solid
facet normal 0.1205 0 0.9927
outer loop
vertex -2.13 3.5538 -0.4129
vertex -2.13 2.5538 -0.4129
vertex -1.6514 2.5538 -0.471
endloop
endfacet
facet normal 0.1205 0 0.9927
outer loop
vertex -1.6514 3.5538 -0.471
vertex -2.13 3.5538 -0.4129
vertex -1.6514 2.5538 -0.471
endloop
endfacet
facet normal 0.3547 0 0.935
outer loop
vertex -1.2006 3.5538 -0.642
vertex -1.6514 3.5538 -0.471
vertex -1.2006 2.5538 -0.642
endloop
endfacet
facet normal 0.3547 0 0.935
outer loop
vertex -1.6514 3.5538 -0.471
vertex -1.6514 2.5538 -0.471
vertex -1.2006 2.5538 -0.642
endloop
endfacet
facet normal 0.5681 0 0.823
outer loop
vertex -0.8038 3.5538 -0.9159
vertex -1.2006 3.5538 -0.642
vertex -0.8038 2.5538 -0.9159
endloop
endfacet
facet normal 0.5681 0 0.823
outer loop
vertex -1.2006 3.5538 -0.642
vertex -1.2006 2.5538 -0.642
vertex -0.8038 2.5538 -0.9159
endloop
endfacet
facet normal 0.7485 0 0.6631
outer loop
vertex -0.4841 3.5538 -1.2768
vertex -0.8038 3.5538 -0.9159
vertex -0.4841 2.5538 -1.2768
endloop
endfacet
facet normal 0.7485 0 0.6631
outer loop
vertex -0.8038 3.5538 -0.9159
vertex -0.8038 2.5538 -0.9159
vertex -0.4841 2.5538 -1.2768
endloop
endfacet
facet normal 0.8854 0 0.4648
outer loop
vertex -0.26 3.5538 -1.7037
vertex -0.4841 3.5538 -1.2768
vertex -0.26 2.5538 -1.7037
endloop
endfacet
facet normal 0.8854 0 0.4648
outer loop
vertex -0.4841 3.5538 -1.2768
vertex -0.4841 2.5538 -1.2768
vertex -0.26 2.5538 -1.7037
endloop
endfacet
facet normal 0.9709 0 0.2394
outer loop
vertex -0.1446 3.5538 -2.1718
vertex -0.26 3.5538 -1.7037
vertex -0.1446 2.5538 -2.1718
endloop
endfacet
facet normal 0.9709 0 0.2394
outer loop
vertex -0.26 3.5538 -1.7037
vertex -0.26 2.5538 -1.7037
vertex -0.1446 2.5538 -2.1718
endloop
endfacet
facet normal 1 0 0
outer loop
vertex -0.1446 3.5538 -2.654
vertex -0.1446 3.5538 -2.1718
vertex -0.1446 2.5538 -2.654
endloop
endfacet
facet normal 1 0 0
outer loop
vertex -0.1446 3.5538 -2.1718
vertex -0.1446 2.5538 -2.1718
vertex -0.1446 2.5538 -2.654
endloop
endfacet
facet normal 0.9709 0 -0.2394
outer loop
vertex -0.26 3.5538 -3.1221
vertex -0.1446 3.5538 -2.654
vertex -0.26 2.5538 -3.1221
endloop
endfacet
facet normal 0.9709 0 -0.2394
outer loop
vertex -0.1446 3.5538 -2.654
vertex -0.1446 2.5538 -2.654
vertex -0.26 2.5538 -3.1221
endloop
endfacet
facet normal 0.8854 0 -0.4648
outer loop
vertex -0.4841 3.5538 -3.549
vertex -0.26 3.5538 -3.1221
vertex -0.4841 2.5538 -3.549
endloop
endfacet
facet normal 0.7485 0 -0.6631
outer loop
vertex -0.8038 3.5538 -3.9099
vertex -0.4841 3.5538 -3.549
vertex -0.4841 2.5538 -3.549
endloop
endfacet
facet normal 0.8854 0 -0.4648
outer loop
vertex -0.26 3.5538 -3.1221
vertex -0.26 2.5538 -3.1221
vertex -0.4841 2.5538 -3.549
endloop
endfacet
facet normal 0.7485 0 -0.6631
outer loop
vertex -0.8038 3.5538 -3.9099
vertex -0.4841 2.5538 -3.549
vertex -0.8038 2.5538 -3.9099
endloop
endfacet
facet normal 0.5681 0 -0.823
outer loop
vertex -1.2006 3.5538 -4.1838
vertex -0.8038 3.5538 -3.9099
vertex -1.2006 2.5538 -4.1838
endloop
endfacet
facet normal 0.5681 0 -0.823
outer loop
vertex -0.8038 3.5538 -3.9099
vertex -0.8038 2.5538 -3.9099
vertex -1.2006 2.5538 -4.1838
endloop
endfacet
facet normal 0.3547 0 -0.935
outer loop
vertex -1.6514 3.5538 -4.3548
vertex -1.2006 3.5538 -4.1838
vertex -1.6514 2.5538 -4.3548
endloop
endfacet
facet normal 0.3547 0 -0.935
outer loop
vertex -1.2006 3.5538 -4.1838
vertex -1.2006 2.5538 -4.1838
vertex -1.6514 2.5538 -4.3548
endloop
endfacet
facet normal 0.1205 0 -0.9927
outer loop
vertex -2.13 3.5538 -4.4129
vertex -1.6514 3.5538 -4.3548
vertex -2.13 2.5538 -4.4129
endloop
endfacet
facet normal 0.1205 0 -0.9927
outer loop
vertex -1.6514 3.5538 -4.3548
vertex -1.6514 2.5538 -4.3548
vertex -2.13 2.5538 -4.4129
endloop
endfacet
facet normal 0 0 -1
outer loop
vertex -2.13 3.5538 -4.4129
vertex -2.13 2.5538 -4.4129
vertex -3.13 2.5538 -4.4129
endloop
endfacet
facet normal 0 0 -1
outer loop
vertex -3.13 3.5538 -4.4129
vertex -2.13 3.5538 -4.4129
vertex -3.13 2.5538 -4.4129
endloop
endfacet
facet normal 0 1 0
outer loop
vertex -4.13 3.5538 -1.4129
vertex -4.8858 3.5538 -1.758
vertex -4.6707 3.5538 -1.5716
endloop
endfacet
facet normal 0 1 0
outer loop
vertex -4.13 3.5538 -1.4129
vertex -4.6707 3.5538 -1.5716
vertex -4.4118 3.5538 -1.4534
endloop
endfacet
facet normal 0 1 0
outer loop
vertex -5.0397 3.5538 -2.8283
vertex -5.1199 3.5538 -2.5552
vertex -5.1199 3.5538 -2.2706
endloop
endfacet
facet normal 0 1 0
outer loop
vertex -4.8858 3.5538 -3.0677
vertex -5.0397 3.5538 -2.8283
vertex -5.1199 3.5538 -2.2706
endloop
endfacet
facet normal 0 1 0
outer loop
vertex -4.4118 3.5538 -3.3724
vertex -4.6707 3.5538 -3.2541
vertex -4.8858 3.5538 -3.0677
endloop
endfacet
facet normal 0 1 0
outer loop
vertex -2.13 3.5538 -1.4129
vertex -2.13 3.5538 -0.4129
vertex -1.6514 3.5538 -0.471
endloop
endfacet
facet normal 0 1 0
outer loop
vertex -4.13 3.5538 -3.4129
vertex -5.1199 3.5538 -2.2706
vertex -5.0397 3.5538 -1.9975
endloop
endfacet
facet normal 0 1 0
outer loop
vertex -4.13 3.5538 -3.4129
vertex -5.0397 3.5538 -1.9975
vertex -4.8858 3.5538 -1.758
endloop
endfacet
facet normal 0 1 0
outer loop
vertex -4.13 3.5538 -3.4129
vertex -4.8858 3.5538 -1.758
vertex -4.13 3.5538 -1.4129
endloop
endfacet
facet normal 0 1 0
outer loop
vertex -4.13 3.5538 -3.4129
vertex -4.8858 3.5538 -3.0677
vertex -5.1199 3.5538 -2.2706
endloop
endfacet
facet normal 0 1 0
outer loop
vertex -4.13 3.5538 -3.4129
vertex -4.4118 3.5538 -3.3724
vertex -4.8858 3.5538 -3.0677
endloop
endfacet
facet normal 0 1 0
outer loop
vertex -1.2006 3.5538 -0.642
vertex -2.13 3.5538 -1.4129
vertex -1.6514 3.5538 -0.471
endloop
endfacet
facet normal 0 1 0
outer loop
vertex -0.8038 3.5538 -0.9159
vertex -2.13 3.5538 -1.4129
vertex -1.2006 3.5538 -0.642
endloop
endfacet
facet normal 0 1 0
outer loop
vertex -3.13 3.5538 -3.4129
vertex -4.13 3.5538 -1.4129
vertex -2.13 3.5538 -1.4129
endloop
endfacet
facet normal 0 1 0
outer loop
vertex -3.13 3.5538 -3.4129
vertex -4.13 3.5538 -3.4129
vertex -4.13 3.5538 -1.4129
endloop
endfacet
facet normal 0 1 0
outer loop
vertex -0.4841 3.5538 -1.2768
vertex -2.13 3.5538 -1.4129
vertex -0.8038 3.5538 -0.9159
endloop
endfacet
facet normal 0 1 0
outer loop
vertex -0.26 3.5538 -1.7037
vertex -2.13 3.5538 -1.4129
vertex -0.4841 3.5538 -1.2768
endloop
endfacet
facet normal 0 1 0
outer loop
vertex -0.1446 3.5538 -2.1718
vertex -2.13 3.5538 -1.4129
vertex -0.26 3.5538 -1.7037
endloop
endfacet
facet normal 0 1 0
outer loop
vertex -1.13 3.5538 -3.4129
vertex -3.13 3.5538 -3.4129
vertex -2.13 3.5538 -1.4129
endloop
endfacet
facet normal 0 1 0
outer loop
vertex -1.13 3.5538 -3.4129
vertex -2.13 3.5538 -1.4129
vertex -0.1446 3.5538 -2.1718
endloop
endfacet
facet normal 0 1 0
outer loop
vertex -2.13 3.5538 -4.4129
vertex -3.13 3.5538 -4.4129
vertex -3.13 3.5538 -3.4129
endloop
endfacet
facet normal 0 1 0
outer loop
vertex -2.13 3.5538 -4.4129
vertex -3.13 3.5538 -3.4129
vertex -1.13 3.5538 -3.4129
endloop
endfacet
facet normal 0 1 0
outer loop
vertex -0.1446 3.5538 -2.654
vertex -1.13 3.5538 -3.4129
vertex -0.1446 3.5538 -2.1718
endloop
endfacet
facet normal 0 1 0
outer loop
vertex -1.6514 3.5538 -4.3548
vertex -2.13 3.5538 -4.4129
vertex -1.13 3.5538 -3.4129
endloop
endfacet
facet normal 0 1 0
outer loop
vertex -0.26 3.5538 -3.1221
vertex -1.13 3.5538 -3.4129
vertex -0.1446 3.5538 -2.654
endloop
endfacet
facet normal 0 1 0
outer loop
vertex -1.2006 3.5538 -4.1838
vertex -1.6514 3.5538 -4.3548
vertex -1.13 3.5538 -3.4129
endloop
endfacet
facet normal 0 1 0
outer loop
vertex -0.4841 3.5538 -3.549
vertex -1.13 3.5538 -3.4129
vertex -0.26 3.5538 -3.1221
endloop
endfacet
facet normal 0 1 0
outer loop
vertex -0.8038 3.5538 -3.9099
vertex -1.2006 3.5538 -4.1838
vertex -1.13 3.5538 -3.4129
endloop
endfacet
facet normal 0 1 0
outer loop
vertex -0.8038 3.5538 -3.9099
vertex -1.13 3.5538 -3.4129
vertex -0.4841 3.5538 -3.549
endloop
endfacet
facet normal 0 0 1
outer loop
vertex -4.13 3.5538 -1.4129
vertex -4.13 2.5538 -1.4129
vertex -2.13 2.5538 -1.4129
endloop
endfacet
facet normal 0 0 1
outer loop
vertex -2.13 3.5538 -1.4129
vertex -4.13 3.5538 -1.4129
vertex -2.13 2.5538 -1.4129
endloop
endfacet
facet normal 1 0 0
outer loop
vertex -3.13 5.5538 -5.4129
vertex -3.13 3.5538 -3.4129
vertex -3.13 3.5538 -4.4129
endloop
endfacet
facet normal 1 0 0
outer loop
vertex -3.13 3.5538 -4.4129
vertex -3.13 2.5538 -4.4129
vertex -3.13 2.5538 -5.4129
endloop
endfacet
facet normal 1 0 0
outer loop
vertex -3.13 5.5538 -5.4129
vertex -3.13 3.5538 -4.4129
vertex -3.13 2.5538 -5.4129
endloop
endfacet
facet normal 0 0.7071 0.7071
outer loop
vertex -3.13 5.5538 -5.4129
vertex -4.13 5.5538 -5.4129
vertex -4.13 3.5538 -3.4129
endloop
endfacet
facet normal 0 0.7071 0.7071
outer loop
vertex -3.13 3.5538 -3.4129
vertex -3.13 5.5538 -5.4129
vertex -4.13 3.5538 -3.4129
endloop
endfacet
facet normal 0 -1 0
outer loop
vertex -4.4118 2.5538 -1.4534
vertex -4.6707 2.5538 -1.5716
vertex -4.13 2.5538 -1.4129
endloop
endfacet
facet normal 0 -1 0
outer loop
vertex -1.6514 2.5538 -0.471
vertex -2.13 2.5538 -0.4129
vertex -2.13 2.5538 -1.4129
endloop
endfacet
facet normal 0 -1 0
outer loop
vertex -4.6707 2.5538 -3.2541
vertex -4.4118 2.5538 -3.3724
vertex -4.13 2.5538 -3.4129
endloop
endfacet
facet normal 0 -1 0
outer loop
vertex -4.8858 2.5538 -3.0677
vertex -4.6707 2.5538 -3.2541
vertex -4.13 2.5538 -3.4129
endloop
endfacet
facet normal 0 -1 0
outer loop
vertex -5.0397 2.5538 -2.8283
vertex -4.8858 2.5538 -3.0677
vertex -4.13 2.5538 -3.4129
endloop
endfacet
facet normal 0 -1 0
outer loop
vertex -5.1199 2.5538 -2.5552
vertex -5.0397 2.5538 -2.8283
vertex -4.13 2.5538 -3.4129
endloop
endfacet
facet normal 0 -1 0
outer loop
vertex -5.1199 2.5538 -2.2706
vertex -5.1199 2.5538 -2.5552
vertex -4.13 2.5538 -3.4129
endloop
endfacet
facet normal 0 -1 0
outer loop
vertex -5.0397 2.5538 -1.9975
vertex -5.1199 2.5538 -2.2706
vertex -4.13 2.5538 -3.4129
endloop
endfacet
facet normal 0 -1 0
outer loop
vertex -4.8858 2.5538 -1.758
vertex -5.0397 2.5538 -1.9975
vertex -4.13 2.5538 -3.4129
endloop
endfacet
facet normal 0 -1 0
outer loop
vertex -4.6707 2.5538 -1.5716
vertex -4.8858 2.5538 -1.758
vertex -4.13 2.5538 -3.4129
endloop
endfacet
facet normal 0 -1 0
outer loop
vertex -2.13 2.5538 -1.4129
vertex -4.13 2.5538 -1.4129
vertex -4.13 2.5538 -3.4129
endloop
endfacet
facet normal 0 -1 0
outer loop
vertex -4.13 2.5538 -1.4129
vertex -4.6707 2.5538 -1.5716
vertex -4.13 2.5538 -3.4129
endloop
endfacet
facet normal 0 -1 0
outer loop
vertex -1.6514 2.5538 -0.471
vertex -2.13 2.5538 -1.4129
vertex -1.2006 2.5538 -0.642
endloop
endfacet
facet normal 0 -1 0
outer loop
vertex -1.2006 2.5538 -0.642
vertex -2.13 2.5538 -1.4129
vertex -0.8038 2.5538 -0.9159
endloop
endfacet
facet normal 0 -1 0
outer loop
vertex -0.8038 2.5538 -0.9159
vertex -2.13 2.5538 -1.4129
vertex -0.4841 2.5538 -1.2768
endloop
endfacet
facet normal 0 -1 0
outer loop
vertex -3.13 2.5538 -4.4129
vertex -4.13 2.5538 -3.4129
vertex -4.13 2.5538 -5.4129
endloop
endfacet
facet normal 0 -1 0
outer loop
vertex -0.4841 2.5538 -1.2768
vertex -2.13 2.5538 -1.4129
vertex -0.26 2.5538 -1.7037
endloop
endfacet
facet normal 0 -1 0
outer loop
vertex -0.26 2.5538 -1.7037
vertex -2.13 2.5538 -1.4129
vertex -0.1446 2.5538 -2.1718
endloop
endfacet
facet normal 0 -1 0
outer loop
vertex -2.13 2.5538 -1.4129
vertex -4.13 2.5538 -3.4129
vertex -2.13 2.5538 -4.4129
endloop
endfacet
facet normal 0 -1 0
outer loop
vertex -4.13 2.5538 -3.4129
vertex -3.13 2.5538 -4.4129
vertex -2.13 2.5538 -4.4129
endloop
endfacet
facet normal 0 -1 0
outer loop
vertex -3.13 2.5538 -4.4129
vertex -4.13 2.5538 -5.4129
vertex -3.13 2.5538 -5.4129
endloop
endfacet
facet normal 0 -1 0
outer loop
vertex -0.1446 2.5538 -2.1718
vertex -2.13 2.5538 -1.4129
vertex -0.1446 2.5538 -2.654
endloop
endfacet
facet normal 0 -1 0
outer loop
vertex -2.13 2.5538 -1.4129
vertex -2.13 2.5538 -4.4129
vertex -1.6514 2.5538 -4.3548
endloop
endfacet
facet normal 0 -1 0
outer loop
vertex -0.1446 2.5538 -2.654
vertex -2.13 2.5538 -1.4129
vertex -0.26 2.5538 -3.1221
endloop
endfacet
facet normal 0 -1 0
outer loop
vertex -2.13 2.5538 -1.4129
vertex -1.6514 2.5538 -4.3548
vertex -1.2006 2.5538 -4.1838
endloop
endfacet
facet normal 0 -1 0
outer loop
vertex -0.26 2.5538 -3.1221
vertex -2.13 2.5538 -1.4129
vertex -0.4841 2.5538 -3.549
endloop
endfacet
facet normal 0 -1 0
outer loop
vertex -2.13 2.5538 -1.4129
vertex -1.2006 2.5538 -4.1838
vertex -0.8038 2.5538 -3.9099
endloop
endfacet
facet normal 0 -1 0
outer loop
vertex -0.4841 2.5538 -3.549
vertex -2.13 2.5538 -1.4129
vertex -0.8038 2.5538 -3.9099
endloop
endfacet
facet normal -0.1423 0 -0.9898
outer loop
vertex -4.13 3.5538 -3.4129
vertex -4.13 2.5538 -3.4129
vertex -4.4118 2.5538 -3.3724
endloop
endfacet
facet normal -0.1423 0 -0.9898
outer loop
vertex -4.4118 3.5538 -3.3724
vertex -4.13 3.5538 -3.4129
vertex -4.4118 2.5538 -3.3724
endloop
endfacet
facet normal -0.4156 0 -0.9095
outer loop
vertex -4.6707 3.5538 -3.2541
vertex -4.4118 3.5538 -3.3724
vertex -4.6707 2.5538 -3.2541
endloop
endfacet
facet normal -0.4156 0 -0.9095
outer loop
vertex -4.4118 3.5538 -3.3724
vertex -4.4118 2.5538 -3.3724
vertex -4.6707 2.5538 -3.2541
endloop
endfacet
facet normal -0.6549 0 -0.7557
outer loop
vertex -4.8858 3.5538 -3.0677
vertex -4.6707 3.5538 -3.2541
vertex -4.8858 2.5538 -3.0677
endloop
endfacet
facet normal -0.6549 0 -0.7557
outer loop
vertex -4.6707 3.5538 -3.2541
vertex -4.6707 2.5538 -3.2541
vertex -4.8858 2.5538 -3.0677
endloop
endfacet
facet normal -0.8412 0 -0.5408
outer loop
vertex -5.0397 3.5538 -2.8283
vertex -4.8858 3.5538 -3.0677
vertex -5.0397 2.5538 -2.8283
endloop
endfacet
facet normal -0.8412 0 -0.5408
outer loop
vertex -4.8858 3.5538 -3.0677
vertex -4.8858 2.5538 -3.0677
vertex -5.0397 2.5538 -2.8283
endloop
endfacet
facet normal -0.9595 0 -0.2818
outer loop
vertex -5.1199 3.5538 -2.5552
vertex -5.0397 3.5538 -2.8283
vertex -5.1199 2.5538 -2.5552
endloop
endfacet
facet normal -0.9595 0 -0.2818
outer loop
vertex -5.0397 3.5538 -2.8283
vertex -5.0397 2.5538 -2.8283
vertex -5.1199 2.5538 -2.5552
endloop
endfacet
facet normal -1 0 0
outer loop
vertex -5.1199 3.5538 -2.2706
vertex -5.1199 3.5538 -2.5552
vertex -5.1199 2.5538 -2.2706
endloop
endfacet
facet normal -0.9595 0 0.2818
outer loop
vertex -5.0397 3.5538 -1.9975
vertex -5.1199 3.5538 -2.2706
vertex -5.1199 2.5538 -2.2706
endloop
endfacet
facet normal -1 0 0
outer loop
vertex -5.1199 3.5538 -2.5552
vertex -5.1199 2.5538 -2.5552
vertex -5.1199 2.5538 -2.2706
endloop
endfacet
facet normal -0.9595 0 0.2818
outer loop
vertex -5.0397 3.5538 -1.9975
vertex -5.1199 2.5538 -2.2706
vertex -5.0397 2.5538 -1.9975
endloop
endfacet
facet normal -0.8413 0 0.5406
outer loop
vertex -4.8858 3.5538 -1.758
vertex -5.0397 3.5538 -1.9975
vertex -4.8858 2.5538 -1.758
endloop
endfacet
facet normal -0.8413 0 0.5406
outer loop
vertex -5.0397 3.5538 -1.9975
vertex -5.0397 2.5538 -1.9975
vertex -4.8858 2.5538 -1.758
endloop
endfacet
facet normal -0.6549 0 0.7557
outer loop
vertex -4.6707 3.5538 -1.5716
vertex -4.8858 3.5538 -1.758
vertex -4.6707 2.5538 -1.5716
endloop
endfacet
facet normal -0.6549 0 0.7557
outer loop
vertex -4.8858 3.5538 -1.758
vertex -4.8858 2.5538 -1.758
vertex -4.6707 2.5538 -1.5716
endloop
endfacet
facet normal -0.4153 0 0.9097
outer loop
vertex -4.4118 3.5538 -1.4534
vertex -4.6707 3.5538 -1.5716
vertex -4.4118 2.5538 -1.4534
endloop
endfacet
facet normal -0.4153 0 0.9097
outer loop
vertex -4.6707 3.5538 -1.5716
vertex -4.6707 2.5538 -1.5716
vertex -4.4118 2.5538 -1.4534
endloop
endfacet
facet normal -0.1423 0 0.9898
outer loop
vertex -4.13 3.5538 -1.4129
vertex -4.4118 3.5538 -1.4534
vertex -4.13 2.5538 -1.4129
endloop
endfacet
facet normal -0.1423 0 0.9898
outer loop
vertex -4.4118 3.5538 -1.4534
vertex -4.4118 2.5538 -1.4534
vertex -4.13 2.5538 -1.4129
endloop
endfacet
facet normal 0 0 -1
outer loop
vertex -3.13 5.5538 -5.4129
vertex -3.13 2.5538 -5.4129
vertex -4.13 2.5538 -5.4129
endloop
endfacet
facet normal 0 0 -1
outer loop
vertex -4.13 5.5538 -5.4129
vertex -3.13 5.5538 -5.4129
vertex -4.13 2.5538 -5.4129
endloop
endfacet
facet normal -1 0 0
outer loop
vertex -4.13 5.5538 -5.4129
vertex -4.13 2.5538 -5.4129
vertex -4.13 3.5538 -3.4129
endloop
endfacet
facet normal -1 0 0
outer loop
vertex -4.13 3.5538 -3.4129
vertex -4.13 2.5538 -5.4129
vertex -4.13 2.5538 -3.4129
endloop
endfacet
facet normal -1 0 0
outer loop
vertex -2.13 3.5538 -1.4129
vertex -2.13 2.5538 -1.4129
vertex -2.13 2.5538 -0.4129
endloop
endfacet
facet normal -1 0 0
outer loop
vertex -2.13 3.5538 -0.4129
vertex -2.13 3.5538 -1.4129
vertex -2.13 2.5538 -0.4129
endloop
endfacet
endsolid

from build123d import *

# Parameters (mm, degrees)
EXTRUDE_1_DEPTH     = 5
EXTRUDE_2_DEPTH     = 15
CUT_EXTRUDE_1_DEPTH = 15
SCALE_1_SCALE       = 0.2


with BuildPart() as part:
    # 草圖1 → 填料-伸長1 (new body)
    with BuildSketch(Plane(origin=(0, 0, 0), x_dir=(1, 0, 0), z_dir=(0, 1, 0))):
        with BuildLine():
            ThreePointArc((-10, 5), (-15, 0), (-10, -5))
            Line((-10, -5), (0, -5))
            Line((0, -5), (0, -10))
            ThreePointArc((0, -10), (10, 0), (0, 10))
            Line((0, 10), (-5, 10))
            Line((-5, 10), (-5, 5))
            Line((-5, 5), (-10, 5))
        make_face()
    extrude(amount=EXTRUDE_1_DEPTH)

    # 草圖1<3> → 填料-伸長2 (add)
    with BuildSketch(Plane(origin=(0, 0, 0), x_dir=(1, 0, 0), z_dir=(0, 1, 0))):
        Polygon((-10, 15), (-10, 5), (-5, 5), (-5, 10), (-5, 15), align=None)
    extrude(amount=EXTRUDE_2_DEPTH)

    # 草圖2 → 除料-伸長1 (cut)
    with BuildSketch(Plane.ZY.offset(10)):
        Polygon((-15, 15), (-5, 5), (-5, 15), align=None)
    extrude(amount=-CUT_EXTRUDE_1_DEPTH, mode=Mode.SUBTRACT)


with BuildPart() as part_1:
    # 縮放比例1: scaled about (-2.662553627, 3.192220208, -3.016102333)
    add(part.part.scale(SCALE_1_SCALE).moved(Location((-2.130042902, 2.553776166, -2.412881866))))


solid = part_1.part
